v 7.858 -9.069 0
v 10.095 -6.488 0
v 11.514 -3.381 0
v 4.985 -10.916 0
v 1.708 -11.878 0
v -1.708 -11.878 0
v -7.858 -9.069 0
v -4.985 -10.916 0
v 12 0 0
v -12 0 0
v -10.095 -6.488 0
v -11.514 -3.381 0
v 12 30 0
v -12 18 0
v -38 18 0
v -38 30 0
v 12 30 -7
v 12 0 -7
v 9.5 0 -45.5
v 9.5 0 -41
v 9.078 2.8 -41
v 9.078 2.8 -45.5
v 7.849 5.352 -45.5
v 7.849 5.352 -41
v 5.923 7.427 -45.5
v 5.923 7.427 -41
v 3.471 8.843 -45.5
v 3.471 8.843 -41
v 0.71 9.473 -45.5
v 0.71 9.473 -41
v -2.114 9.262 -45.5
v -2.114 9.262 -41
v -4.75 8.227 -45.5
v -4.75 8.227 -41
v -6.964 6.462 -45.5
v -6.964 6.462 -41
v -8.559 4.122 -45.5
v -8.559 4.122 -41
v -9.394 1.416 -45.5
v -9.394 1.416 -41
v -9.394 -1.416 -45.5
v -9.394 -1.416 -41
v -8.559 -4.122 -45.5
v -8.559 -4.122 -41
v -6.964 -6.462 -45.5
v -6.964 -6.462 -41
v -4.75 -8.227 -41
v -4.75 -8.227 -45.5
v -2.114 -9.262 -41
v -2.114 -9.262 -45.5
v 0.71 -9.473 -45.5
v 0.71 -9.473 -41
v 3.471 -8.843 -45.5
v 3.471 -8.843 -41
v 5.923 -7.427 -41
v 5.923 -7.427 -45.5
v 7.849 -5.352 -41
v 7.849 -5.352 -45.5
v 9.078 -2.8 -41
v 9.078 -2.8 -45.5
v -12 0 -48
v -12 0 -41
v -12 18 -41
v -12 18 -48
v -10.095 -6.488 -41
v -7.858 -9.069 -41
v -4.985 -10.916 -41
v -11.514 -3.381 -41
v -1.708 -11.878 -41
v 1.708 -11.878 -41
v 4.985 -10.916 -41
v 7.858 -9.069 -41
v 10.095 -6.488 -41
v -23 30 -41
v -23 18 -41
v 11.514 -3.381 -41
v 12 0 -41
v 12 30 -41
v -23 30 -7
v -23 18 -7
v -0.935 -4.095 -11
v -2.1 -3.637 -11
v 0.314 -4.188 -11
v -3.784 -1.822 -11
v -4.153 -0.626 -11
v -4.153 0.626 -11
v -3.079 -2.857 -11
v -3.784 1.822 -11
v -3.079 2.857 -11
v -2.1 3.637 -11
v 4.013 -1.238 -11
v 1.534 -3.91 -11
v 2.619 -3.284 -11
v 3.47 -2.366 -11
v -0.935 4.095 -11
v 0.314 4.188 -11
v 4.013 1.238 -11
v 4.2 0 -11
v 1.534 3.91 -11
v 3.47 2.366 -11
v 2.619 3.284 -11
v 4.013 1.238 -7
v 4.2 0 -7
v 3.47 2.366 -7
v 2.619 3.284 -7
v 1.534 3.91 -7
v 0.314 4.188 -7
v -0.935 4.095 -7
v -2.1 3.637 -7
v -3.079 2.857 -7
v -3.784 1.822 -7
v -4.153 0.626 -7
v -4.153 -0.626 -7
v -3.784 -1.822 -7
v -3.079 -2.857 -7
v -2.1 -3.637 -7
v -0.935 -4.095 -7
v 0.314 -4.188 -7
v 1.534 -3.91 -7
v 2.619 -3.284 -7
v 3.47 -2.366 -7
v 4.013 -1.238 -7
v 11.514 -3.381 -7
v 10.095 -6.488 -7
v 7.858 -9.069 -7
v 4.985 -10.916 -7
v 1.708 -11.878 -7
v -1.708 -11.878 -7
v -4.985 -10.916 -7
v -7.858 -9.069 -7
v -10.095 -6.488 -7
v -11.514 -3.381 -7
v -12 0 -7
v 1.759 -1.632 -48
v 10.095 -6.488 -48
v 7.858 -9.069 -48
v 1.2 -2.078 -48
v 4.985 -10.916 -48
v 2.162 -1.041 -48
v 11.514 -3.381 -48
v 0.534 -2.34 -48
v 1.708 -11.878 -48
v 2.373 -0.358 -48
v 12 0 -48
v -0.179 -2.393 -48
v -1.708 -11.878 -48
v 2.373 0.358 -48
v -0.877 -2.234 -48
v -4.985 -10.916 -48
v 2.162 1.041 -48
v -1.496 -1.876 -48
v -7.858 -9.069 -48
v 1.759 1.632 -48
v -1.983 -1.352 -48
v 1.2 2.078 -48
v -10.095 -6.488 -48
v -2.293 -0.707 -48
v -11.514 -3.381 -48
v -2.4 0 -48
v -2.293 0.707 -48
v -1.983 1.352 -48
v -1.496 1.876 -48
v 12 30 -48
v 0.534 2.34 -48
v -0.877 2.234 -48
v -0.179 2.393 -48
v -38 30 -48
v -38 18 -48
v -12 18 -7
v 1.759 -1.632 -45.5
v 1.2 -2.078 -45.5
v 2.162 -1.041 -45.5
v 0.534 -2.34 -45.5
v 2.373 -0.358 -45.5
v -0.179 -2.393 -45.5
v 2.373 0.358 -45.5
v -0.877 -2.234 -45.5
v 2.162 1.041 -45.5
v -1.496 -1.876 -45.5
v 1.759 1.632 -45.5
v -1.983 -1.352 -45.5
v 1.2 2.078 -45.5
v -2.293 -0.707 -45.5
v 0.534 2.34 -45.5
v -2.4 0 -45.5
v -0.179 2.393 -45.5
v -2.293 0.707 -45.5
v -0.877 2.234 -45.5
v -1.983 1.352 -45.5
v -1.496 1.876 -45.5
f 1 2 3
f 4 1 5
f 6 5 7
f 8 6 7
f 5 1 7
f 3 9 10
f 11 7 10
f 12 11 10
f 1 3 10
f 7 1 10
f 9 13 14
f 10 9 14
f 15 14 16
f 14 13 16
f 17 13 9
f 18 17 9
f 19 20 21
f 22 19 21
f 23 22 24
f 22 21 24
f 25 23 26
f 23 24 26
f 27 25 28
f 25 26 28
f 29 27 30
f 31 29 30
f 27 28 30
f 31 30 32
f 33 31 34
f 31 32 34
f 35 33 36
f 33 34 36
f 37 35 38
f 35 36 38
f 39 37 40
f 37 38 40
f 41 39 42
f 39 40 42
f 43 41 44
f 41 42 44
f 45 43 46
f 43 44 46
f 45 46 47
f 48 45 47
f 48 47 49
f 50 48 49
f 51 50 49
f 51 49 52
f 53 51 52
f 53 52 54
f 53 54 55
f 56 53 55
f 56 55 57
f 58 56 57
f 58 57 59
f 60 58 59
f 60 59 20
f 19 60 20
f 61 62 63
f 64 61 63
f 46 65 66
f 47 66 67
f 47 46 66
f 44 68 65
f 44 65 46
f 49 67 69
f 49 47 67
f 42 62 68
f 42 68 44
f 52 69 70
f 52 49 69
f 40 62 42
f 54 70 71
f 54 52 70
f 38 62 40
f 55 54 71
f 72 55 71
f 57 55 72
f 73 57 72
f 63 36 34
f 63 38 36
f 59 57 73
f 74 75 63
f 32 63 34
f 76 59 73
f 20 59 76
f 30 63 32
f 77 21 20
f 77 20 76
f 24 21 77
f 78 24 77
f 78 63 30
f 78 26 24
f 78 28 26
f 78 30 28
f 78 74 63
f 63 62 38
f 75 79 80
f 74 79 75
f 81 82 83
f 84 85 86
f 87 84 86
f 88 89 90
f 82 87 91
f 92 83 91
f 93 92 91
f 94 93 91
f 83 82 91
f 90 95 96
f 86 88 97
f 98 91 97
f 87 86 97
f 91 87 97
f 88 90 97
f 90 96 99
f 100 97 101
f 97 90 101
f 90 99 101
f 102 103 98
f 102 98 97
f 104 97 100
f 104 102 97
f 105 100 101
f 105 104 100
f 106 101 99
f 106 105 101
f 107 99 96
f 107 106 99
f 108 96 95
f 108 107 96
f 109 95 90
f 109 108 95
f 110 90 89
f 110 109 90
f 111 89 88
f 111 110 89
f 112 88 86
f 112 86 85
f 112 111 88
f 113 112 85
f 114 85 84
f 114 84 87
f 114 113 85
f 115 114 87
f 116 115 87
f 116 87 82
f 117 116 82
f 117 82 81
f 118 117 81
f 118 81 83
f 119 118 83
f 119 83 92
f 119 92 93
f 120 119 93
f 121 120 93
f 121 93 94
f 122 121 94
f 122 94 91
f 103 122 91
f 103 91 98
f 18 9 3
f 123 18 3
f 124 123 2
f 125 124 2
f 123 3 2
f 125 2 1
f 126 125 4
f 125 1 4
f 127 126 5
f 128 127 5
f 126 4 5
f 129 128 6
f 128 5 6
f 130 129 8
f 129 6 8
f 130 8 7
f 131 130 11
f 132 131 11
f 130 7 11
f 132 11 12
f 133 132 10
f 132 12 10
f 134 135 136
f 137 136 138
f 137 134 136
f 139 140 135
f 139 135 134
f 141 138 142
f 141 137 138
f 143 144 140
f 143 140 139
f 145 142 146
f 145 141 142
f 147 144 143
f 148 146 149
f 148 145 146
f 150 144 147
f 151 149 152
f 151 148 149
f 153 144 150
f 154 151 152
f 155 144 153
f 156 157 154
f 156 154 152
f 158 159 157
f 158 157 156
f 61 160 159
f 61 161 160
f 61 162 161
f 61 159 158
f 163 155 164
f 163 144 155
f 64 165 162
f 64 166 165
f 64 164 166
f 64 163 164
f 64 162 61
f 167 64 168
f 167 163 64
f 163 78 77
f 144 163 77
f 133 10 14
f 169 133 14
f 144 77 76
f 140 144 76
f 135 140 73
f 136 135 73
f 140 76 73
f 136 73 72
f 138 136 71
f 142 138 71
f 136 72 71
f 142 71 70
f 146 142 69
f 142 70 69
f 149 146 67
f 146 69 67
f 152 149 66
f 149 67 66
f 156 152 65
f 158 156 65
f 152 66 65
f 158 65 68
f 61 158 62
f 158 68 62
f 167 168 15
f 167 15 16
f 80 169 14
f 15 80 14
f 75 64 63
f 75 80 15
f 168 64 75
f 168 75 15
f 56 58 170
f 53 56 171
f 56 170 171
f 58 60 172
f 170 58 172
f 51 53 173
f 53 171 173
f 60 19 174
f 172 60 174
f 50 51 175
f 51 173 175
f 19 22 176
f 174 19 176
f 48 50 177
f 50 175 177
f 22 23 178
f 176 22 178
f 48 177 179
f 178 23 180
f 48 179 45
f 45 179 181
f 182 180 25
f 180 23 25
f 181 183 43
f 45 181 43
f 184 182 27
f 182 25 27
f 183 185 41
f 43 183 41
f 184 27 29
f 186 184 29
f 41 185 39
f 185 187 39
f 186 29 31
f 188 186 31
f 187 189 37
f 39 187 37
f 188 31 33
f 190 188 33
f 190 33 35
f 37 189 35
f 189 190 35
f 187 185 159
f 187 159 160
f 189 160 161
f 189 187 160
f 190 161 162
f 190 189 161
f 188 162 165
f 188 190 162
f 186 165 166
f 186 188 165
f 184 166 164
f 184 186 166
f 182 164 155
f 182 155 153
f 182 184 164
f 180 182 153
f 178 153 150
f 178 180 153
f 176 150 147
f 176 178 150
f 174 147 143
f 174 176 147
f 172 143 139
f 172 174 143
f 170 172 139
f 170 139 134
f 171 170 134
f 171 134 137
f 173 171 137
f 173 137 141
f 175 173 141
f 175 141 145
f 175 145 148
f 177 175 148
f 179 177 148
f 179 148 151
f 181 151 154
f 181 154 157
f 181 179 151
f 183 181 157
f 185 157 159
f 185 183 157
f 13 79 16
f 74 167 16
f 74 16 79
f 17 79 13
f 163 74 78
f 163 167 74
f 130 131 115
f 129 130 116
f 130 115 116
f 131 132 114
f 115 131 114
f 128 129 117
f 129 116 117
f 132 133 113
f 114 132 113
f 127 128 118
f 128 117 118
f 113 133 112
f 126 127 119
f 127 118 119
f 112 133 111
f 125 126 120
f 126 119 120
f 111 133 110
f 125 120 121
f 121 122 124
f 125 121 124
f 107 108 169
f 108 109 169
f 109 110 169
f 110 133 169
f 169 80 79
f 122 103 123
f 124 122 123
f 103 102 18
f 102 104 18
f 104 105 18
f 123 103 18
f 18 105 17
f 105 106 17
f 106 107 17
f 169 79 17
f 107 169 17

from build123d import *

# Parameters (mm, degrees)
SKETCH1_R           = 9.5
BOSS_EXTRUDE1_DEPTH = 48
SKETCH2_W           = 34
SKETCH2_H           = 30
CUT_EXTRUDE1_DEPTH  = 62.481704596
BOSS_EXTRUDE2_START = -2.5
SKETCH3_R           = 9.5
SKETCH3_R_2         = 2.4
BOSS_EXTRUDE2_DEPTH = 2.5
SKETCH4_R           = 9.5
SKETCH4_R_2         = 4.2
BOSS_EXTRUDE3_DEPTH = 7
SKETCH5_R           = 4.2
BOSS_EXTRUDE4_DEPTH = 11
BOSS_EXTRUDE5_DEPTH = 48
SKETCH7_W           = 35
SKETCH7_H           = 34
CUT_EXTRUDE2_DEPTH  = 14.5


with BuildPart() as part:
    # Sketch1 → Boss-Extrude1 (new body)
    with BuildSketch(Plane.XY):
        with BuildLine():
            Line((-12, 0), (-12, 30))
            Line((-12, 30), (12, 30))
            Line((12, 30), (12, 0))
            ThreePointArc((12, 0), (0, -12), (-12, 0))
        make_face()
        Circle(SKETCH1_R, mode=Mode.SUBTRACT)
    extrude(amount=-BOSS_EXTRUDE1_DEPTH)

    # Sketch2 → Cut-Extrude1 (cut, through all)
    with BuildSketch(Plane.ZY.offset(12)):
        with Locations((-24, 3)):
            Rectangle(SKETCH2_W, SKETCH2_H)
    extrude(amount=-CUT_EXTRUDE1_DEPTH, mode=Mode.SUBTRACT)

    # Sketch3 → Boss-Extrude2 (add)
    with BuildSketch(Plane(origin=(0, 0, -48), x_dir=(-1, 0, 0), z_dir=(0, 0, -1)).offset(BOSS_EXTRUDE2_START)):
        Circle(SKETCH3_R)
        Circle(SKETCH3_R_2, mode=Mode.SUBTRACT)
    extrude(amount=BOSS_EXTRUDE2_DEPTH)

    # Sketch4 → Boss-Extrude3 (add)
    with BuildSketch(Plane.XY):
        with Locations(Location((0, 0, 0), (0, 0, 180))):
            Circle(SKETCH4_R)
        Circle(SKETCH4_R_2, mode=Mode.SUBTRACT)
    extrude(amount=-BOSS_EXTRUDE3_DEPTH)

    # Sketch5 → Boss-Extrude4 (add)
    with BuildSketch(Plane.XY):
        Circle(SKETCH5_R)
    extrude(amount=-BOSS_EXTRUDE4_DEPTH)

    # Sketch6 → Boss-Extrude5 (add)
    with BuildSketch(Plane(origin=(0, 0, -48), x_dir=(-1, 0, 0), z_dir=(0, 0, -1))):
        Polygon((12, 30), (12, 18), (18, 18), (38, 18), (38, 30), align=None)
    extrude(amount=-BOSS_EXTRUDE5_DEPTH)

    # Sketch7 → Cut-Extrude2 (cut)
    with BuildSketch(Plane(origin=(0, 30, 0), x_dir=(1, 0, 0), z_dir=(0, 1, 0))):
        with Locations((-5.5, 24)):
            Rectangle(SKETCH7_W, SKETCH7_H)
    extrude(amount=-CUT_EXTRUDE2_DEPTH, mode=Mode.SUBTRACT)


solid = part.part
